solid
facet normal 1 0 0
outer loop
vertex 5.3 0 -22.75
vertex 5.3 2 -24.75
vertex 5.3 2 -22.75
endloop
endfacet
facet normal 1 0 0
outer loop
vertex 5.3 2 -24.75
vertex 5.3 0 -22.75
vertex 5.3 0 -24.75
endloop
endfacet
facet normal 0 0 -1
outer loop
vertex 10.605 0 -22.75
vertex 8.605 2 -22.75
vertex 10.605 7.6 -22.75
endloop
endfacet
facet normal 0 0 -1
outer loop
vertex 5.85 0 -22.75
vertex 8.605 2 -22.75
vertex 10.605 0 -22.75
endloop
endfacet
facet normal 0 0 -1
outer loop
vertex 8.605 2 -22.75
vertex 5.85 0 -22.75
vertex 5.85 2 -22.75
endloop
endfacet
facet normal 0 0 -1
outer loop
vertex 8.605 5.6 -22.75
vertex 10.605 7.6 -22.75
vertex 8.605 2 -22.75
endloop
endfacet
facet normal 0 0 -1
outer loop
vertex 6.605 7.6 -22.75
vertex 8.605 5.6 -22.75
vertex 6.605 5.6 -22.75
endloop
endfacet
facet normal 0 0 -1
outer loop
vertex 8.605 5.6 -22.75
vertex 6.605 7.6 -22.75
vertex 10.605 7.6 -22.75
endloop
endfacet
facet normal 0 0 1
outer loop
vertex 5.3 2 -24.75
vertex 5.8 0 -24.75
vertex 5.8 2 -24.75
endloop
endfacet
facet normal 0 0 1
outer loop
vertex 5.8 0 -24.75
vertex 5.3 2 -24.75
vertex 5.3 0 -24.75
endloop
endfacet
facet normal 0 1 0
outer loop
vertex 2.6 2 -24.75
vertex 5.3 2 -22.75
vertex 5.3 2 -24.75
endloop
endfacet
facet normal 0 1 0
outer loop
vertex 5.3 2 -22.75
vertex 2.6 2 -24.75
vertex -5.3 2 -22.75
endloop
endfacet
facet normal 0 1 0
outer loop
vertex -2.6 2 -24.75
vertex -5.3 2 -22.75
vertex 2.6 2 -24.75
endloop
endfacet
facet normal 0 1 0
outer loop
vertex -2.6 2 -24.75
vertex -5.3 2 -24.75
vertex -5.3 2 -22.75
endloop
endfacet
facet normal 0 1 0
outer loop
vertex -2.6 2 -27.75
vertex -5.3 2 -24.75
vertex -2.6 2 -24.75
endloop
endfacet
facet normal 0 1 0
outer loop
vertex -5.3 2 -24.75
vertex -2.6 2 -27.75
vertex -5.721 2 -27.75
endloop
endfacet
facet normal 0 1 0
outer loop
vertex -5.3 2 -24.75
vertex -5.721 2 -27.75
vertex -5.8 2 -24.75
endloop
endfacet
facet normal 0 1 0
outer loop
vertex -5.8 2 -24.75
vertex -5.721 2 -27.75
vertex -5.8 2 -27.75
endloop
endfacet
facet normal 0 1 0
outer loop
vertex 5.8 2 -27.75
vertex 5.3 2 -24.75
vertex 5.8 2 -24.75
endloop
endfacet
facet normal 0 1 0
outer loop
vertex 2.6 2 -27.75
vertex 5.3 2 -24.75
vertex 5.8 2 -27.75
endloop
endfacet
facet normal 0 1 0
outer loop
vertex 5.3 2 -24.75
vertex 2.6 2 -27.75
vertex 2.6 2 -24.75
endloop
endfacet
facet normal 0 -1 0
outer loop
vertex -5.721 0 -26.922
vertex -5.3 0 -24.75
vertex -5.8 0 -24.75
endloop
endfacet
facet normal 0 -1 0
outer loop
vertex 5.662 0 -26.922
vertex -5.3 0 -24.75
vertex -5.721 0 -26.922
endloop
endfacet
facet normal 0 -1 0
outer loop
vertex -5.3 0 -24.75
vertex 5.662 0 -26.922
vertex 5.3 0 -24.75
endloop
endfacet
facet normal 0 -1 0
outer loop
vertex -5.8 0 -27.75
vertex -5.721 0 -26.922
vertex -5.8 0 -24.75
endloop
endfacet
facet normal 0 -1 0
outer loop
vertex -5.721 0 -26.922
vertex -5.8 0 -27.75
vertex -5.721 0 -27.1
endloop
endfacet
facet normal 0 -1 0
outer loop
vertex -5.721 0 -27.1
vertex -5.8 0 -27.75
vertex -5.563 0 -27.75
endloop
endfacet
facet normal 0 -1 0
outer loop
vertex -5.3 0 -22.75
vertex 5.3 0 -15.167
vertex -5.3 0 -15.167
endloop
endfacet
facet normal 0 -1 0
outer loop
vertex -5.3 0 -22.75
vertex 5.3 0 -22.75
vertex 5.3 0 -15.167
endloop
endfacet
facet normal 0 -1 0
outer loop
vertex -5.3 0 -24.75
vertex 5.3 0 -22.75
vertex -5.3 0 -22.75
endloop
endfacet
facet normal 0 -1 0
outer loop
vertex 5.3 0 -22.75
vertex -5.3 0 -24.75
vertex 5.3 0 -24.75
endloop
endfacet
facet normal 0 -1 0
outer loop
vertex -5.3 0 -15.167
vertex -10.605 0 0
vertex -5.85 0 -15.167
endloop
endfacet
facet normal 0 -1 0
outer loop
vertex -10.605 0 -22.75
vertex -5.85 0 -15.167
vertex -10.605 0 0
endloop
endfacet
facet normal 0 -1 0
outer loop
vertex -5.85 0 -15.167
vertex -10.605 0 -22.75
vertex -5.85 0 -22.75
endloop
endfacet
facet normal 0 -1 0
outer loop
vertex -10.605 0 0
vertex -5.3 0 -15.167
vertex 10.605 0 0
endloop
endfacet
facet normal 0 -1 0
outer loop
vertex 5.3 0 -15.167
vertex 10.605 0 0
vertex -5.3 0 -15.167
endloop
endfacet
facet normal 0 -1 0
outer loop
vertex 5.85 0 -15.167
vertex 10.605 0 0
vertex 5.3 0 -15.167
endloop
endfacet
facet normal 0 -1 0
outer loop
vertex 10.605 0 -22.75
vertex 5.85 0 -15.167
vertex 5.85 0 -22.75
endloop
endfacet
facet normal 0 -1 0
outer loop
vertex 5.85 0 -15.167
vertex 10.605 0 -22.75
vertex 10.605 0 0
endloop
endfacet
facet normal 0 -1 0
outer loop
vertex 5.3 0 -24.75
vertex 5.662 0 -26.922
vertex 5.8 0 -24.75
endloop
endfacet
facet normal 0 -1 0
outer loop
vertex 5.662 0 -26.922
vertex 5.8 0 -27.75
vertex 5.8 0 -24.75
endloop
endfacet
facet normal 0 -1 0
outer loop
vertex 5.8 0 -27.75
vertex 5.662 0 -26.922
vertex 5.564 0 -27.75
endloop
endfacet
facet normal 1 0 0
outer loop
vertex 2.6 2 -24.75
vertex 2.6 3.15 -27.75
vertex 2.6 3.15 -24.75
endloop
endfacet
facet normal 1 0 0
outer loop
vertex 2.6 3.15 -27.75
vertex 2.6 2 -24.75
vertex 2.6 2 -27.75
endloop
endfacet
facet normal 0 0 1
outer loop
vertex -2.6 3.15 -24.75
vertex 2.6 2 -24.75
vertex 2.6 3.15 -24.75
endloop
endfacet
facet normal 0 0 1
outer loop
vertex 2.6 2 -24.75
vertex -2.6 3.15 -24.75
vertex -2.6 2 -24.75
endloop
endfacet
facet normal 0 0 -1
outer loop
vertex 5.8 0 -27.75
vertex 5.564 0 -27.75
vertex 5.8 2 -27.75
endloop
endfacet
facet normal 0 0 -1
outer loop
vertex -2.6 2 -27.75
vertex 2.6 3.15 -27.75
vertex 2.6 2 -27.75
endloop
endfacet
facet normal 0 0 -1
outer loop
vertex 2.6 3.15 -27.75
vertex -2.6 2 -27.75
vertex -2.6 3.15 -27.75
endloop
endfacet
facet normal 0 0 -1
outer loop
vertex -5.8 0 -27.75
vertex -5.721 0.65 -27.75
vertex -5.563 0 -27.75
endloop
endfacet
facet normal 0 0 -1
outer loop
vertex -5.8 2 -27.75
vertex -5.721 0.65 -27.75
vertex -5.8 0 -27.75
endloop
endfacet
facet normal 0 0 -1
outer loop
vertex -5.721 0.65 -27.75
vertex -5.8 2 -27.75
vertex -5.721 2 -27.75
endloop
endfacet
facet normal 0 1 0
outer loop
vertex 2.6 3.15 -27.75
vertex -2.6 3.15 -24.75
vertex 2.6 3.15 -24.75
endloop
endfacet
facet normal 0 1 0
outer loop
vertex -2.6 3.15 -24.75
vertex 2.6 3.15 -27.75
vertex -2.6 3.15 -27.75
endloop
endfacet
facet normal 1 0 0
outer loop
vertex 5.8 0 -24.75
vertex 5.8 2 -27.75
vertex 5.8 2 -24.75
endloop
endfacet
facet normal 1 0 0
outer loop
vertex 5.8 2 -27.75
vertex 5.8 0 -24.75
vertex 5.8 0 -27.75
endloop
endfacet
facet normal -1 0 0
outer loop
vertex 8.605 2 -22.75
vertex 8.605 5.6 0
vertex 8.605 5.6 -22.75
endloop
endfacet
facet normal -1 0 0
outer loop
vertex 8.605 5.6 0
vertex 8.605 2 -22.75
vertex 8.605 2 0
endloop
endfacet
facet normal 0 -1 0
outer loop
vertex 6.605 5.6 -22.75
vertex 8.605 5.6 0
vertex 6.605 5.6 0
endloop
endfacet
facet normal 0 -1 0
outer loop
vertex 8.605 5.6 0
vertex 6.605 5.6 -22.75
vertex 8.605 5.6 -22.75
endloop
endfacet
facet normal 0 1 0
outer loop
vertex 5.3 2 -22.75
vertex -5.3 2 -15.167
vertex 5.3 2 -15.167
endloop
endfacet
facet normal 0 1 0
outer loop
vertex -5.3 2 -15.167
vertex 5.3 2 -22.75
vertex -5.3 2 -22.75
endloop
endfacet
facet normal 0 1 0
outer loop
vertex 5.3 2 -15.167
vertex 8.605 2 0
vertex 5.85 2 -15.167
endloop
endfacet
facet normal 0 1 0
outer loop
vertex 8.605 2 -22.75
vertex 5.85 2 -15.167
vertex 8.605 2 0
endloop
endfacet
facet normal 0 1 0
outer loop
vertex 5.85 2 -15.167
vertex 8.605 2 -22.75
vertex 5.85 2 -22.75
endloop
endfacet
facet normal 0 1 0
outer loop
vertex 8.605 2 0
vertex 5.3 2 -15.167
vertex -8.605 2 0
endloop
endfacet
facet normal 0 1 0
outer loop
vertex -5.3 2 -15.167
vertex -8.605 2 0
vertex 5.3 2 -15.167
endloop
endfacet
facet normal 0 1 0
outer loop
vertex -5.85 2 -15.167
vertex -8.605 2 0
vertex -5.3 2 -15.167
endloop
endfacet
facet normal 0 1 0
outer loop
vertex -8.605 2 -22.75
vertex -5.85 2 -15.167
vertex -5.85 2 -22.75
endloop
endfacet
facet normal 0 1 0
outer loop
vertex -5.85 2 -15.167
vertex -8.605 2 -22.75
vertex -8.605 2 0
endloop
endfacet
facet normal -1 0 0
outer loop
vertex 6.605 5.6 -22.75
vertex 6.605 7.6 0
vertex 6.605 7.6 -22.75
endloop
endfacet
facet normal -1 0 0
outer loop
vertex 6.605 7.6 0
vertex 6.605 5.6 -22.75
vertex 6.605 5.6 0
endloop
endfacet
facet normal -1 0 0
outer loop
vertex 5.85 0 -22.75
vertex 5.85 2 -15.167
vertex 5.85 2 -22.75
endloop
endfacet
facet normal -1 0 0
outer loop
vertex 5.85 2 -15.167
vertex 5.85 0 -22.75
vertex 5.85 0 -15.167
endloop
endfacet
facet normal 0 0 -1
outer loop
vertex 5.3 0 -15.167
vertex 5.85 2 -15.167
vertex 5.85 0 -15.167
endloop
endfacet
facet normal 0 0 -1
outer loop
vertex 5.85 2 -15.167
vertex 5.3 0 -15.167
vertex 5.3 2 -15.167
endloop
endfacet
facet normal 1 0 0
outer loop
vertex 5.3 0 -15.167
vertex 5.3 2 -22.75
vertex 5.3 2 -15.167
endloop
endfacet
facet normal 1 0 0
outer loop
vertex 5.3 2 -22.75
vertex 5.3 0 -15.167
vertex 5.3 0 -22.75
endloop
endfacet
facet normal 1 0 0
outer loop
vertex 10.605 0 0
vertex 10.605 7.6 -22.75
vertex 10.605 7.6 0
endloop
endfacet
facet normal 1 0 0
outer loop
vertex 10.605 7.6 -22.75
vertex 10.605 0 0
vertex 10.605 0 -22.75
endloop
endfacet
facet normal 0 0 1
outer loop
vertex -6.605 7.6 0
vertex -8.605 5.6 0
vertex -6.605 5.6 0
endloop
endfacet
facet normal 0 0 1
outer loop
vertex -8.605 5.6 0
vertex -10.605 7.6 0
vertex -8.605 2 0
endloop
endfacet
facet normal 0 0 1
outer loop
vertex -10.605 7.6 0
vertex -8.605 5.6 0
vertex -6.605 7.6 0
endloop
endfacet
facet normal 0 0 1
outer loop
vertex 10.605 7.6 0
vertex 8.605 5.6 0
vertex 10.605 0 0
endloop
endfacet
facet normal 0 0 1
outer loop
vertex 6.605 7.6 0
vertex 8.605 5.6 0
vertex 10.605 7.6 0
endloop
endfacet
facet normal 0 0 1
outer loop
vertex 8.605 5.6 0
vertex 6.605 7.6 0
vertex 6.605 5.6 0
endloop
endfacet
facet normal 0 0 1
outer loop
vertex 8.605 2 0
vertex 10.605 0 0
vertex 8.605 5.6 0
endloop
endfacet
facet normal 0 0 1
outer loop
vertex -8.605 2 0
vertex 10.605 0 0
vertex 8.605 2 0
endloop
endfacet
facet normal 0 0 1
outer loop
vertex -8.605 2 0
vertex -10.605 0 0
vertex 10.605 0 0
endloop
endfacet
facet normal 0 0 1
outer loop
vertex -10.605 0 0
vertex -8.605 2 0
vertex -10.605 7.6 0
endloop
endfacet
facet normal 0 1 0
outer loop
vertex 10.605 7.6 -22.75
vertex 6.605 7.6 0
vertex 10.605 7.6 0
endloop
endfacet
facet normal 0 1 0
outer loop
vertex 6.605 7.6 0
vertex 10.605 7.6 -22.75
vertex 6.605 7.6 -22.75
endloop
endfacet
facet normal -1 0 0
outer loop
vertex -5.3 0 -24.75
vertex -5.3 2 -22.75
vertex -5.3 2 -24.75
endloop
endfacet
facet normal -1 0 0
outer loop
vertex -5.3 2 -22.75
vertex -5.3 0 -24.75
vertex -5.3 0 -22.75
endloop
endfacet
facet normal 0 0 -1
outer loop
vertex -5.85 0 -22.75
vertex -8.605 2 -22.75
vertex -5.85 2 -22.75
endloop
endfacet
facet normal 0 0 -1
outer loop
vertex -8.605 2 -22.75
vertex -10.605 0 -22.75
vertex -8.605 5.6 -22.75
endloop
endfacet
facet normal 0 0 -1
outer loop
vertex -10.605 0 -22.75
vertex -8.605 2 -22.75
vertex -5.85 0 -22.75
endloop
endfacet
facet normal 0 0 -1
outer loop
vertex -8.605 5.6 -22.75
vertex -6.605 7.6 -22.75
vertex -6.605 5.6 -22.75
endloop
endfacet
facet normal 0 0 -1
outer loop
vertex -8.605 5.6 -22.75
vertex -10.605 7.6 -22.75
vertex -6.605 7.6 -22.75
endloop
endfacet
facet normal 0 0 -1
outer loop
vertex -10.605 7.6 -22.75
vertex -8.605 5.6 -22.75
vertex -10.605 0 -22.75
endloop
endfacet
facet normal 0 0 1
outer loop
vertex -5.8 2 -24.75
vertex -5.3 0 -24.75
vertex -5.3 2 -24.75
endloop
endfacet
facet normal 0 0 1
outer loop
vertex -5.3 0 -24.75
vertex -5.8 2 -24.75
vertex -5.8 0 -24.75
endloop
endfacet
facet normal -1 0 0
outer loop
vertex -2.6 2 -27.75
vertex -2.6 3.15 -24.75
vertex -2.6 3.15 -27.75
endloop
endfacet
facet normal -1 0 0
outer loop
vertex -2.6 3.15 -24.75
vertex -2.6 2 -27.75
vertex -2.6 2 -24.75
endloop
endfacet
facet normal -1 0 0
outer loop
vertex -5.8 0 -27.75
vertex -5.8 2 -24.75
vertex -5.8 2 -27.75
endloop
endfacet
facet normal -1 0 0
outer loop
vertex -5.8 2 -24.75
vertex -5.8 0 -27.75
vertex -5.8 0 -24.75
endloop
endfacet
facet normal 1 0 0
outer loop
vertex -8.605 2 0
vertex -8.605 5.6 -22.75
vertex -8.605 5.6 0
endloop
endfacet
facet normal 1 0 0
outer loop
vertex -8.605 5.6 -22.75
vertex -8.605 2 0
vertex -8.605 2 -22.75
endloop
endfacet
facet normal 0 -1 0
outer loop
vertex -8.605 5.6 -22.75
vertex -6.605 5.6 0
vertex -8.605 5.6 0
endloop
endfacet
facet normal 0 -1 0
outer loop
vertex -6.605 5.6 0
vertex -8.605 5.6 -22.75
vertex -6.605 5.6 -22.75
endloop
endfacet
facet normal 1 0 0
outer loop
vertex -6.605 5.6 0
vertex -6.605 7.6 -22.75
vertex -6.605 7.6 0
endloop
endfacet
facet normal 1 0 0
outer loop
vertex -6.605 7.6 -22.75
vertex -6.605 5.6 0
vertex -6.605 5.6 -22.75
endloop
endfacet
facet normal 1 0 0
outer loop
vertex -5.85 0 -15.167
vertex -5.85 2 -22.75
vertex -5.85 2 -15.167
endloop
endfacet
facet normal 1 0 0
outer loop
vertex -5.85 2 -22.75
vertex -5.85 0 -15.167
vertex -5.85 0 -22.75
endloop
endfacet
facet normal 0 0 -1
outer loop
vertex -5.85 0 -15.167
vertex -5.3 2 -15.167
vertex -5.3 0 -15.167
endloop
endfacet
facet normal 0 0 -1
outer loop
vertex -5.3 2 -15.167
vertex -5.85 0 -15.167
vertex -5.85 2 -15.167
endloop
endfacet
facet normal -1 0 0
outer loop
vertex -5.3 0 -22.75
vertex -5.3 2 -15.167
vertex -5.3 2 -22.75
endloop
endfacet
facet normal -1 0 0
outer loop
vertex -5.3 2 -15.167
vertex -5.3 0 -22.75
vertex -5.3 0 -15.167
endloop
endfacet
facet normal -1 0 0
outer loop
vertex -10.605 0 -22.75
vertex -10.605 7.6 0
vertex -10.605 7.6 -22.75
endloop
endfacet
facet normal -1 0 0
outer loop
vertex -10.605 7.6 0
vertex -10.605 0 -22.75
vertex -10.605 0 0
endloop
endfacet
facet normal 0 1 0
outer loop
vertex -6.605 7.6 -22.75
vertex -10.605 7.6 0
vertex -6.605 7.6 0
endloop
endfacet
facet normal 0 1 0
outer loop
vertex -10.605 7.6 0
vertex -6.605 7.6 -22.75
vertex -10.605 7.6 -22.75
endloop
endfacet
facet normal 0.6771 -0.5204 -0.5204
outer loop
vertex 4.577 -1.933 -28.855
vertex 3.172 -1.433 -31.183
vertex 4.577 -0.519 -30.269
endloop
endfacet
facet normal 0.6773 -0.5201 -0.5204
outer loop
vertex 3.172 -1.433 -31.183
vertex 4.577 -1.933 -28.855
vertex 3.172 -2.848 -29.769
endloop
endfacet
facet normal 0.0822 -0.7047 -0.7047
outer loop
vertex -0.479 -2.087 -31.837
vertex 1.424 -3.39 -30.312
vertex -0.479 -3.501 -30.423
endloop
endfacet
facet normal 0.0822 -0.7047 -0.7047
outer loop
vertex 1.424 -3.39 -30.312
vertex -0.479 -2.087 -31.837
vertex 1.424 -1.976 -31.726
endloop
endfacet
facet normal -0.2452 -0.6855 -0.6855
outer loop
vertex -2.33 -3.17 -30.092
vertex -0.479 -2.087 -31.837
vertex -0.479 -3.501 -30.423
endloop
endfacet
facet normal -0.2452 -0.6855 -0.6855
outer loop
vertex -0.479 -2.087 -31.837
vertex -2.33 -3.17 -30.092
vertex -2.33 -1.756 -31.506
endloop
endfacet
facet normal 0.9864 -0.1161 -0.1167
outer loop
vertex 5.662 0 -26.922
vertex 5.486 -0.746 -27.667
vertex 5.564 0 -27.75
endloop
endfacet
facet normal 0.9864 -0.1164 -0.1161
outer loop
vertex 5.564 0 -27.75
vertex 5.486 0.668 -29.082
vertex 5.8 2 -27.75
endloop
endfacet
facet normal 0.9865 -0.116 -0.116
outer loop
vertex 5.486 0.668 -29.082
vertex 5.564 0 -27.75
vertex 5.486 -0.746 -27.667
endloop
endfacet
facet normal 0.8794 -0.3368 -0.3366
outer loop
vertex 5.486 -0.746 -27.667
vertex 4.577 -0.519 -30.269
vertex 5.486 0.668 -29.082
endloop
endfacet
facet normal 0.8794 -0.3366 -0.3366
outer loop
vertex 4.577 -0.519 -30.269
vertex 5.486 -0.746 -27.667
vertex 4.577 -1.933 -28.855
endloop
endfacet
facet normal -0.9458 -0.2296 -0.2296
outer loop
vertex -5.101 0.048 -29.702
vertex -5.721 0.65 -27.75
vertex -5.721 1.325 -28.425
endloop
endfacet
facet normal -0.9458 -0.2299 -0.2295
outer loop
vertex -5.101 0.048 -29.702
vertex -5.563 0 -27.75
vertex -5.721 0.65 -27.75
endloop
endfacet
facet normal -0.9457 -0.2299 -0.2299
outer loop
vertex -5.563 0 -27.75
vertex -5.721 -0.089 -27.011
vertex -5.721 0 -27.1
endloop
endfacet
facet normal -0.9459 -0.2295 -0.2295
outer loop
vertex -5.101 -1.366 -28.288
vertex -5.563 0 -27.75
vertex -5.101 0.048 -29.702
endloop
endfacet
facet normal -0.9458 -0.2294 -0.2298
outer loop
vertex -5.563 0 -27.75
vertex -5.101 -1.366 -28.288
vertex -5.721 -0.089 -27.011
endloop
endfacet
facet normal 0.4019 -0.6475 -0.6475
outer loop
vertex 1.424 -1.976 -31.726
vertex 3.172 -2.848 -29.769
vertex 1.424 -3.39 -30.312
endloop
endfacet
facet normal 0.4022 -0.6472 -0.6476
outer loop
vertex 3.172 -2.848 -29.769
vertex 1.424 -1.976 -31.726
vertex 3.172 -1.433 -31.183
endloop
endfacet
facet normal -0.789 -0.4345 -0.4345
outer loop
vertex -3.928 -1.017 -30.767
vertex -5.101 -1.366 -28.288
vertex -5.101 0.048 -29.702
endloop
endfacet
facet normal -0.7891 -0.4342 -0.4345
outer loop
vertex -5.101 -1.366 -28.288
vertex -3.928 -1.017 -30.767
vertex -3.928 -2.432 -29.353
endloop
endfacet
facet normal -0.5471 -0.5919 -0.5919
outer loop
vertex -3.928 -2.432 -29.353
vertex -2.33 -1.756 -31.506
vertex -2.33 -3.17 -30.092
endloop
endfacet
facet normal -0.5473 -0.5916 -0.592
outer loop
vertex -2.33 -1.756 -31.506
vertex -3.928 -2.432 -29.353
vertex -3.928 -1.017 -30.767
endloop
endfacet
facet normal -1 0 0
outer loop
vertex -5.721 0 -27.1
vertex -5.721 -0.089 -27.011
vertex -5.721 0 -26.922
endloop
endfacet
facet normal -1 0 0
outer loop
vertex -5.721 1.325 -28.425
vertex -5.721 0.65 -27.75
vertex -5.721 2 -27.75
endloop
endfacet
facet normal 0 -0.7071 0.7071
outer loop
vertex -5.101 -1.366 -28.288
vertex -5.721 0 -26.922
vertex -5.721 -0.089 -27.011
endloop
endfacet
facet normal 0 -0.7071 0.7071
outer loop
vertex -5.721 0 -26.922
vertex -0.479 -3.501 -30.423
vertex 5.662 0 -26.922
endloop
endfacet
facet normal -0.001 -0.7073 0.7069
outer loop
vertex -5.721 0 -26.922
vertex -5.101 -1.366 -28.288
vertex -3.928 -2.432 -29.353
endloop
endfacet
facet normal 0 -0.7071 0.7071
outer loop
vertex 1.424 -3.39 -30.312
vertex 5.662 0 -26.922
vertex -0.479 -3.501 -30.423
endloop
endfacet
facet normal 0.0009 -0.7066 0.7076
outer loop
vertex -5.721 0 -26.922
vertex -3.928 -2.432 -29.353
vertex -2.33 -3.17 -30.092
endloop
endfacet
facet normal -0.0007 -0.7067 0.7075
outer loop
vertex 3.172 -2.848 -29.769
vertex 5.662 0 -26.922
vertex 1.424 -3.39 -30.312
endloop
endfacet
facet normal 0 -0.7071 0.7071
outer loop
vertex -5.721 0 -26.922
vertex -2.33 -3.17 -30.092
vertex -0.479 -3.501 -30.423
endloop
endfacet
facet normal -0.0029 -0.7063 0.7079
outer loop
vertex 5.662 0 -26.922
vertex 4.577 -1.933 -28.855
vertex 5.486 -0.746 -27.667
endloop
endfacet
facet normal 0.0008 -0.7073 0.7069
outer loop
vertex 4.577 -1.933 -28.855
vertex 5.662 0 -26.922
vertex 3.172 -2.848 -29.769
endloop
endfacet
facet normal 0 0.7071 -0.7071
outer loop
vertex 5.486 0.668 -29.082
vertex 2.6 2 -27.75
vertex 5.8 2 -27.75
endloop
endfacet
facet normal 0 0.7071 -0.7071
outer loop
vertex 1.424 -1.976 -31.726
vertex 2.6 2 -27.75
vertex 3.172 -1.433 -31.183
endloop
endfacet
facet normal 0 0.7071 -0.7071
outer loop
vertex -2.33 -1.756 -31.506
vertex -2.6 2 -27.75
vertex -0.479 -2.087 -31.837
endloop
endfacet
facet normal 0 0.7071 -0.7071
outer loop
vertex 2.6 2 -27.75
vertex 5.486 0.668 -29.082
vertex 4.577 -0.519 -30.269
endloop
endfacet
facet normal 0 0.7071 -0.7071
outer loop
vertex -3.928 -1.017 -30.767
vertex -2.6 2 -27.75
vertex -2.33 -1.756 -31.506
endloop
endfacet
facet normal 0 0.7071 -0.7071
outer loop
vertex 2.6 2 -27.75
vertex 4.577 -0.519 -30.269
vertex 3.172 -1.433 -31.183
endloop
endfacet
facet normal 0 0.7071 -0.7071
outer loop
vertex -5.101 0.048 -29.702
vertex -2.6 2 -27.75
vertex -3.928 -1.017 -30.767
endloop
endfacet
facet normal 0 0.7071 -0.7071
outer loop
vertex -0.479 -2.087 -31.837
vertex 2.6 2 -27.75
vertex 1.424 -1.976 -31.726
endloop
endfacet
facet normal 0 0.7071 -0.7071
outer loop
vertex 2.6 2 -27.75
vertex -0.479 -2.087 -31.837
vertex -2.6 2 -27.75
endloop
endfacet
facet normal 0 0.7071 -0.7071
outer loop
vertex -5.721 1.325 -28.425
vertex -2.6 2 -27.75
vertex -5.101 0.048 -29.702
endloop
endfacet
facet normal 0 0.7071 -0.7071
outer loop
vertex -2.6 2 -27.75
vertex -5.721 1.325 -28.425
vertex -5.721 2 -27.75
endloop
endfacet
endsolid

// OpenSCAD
// preview[view:northwest, tilt:bottomdiagonal]

/* [holder chinese laser] */

// min width of the plastic walls.
wall = 2; // plastic walls are 2mm

// we will model the whole thing based on the hole in the middle, since that is all we care about. It should be the measured from the male part on the bike light you want to attach here.
innerWidth = 17.21; // the side to side of the shaft
innerDepth = 3.6; // the depth the shaft
// height does not matter much for the male part, as it will pass trhu the whole part. So just enter a good height so that it reaches the latch on the bottom.
partHeight = 22.75;
// width of the thumb thing for the latch
handle_width = 11.6;

module main_part(){
	latch();
	difference(){
		// the main block where we will chip the pieces away
		cube([ innerWidth/2 + wall, innerDepth+wall*2 , partHeight] );
		main_cuts();
	}
}
module latch(){
	// bottom latch
	translate([ 0, 0, -wall ] ){
		cube( [ handle_width/2 -0.5, wall, wall] );
	}
	// the latching block
	translate([ 0, wall, -3-wall ] ){
		cube( [ 5.20/2, 1.15, 3] );
	}
	// the lachking block base
	translate([ 0, 0, -3-wall ] ){
		cube( [ handle_width/2, wall, 3] );
	}
	//handle();
}
module handle(){
	// the handle
	translate([ 0, wall, -3-wall ] ){
		rotate([45, 0, 0])
			difference(){
				cylinder( h=wall, r=handle_width/2);
				color("blue") rotate([0,0,90])
					translate([0, -handle_width/2-0.001,-0.001])
						cube([ handle_width/2+0.002, handle_width+0.002 , handle_width+0.002]);
			}
	}

}

module main_cuts(){
	// the inner shaft
	translate( [ -0.001, wall, -0.001] ){
		cube([ innerWidth/2+0.001, innerDepth, partHeight+0.002] );
	}
	// the front wall opening
	translate( [ -0.001, (wall)+innerDepth-0.001, -0.001] ){
		cube([ innerWidth/2-wall+0.001, wall+0.002, partHeight+0.002] );
	}
	// the two cuts on the side leading to the latch so that it can move back/forth
	translate( [ handle_width/2-0.5, -0.001, -0.001] ){
		cube([ 0.55, wall+0.002, partHeight/3+0.001]);
	}
}

main();
module main(){
	translate([0,0,-partHeight]){
		main_part();
		actual_mirror();
		handle();
	}
}

// mirror the geometry... why the fuck mirror does not copy? that way it is just an alias to rotate()
module actual_mirror(){
	mirror([10,0,0]){
		main_part();
	}
}
